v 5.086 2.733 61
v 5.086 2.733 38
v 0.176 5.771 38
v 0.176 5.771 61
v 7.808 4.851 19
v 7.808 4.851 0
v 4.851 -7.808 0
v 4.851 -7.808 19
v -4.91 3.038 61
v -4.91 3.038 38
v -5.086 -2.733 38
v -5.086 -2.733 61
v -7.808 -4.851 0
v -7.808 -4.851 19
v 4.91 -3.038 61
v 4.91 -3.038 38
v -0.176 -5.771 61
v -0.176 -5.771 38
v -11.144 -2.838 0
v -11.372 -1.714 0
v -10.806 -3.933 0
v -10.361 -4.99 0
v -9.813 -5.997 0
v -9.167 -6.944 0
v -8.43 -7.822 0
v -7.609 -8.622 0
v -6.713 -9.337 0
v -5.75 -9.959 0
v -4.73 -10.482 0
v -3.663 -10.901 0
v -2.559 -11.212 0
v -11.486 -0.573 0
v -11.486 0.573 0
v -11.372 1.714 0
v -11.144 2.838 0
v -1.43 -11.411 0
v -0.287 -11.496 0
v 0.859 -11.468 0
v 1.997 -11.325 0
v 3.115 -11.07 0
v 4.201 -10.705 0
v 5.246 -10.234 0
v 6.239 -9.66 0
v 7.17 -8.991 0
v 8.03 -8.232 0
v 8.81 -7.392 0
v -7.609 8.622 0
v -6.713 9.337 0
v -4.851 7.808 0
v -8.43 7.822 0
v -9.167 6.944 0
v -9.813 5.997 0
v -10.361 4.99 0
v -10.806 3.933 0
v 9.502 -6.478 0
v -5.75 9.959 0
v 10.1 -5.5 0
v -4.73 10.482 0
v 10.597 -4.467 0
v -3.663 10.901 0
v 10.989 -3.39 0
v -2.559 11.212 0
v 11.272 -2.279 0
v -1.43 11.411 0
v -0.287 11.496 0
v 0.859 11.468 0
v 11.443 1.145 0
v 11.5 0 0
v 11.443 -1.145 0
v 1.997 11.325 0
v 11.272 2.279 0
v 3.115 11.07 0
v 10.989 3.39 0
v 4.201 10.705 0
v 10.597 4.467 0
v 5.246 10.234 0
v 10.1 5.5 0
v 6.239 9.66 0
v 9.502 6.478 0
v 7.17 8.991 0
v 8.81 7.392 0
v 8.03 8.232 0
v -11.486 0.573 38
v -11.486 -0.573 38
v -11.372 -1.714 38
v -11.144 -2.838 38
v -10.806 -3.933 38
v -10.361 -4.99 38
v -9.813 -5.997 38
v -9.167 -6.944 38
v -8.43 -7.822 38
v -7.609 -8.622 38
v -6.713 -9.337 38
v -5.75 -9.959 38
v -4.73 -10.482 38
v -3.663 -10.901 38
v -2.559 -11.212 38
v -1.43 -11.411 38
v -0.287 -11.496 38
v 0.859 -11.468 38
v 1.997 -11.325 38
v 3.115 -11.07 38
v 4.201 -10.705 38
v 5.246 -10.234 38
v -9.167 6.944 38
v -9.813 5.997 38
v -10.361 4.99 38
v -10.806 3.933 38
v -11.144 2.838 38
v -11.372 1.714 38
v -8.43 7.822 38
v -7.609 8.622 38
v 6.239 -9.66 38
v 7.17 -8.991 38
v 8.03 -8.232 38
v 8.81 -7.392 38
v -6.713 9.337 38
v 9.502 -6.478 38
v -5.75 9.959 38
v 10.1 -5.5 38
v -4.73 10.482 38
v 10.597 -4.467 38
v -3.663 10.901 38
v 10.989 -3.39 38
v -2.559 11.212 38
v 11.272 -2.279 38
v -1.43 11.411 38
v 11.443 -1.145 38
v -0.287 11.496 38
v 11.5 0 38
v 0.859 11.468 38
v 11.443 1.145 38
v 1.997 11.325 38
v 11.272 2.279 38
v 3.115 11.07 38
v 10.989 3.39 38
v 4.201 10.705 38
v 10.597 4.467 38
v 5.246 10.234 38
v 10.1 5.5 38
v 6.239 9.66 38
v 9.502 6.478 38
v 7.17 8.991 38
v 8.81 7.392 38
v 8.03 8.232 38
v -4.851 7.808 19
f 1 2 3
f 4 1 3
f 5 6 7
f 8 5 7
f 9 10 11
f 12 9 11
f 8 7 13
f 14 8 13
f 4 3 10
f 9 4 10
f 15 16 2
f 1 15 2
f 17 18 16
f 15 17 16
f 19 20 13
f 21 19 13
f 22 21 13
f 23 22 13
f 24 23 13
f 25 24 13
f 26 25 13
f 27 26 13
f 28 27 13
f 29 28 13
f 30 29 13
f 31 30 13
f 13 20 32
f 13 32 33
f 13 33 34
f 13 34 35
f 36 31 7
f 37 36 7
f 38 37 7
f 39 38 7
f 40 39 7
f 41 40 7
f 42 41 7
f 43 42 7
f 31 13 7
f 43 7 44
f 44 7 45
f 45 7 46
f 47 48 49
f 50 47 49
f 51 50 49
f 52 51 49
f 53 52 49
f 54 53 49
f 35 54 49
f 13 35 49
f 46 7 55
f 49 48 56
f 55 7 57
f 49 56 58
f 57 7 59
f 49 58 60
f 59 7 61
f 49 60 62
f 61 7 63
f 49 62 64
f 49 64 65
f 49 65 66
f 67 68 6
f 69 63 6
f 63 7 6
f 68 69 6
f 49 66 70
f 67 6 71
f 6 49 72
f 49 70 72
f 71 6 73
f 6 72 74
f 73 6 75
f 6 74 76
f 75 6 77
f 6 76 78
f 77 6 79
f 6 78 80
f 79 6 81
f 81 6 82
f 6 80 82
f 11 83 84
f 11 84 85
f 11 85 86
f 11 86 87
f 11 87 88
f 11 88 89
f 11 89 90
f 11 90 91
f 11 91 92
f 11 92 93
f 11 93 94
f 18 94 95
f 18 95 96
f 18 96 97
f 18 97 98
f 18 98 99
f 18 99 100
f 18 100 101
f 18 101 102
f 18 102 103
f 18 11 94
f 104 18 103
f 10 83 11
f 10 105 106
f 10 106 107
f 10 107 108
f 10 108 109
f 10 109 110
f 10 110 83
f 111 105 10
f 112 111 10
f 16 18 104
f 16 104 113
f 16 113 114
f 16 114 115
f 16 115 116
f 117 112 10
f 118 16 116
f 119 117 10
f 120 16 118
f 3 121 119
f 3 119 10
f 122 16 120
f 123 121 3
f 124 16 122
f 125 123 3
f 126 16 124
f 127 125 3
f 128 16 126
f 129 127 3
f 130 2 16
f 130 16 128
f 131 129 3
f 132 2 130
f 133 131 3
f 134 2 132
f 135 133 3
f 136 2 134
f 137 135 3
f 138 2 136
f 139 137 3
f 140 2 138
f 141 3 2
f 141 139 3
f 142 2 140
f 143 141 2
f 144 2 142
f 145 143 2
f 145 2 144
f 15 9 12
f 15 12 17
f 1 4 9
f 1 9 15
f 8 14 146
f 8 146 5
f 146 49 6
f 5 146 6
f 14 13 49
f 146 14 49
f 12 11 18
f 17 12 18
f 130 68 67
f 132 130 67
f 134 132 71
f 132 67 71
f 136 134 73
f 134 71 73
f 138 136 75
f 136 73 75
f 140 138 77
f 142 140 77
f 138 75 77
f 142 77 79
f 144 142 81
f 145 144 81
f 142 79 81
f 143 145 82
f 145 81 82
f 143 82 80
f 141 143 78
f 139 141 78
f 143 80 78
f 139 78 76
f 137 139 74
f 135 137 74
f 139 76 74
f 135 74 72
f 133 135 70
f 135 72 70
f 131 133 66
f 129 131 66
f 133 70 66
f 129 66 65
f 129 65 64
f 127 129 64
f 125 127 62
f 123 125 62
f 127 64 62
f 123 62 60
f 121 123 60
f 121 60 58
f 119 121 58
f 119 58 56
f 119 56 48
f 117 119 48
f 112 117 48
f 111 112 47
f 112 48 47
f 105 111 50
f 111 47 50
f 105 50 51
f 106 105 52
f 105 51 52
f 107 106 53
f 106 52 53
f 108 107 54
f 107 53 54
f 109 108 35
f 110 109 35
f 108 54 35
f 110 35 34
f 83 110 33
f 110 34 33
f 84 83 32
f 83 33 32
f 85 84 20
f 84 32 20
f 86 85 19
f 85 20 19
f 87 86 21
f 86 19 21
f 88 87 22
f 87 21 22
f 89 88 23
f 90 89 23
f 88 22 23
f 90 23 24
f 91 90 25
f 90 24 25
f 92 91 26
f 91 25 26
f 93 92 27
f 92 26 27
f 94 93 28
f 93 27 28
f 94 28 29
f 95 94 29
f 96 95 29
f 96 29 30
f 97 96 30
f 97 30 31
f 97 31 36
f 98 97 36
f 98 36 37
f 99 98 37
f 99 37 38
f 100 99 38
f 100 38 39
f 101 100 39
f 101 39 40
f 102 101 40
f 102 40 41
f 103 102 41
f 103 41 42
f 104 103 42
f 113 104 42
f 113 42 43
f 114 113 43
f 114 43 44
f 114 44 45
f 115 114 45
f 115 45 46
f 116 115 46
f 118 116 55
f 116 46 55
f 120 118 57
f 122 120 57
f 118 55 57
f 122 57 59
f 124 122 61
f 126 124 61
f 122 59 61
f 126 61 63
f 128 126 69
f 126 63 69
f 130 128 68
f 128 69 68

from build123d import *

# Parameters (mm, degrees)
F0_R     = 11.5
F1_DEPTH = 38
F3_DEPTH = 23
F5_DEPTH = 19


with BuildPart() as f1:
    # F0 (on Top) → F1 (new body)
    with BuildSketch(Plane.XY):
        Circle(F0_R)
    extrude(amount=F1_DEPTH)

    # F2 (on face) → F3 (join)
    with BuildSketch(Plane.XY.offset(38)):
        Polygon((5.085656, 2.733027), (0.175957, 5.770821), (-4.909699, 3.037793), (-5.085656, -2.733027), (-0.175957, -5.770821), (4.909699, -3.037793), align=None)
    extrude(amount=F3_DEPTH)

    # F4 (on face) → F5 (cut)
    with BuildSketch(Plane(origin=(0, 0, 0), x_dir=(1, 0, 0), z_dir=(0, 0, -1))):
        Polygon((7.807994, -4.851312), (4.851312, 7.807994), (-7.807994, 4.851312), (-4.851312, -7.807994), align=None)
    extrude(amount=-F5_DEPTH, mode=Mode.SUBTRACT)


solid = f1.part
